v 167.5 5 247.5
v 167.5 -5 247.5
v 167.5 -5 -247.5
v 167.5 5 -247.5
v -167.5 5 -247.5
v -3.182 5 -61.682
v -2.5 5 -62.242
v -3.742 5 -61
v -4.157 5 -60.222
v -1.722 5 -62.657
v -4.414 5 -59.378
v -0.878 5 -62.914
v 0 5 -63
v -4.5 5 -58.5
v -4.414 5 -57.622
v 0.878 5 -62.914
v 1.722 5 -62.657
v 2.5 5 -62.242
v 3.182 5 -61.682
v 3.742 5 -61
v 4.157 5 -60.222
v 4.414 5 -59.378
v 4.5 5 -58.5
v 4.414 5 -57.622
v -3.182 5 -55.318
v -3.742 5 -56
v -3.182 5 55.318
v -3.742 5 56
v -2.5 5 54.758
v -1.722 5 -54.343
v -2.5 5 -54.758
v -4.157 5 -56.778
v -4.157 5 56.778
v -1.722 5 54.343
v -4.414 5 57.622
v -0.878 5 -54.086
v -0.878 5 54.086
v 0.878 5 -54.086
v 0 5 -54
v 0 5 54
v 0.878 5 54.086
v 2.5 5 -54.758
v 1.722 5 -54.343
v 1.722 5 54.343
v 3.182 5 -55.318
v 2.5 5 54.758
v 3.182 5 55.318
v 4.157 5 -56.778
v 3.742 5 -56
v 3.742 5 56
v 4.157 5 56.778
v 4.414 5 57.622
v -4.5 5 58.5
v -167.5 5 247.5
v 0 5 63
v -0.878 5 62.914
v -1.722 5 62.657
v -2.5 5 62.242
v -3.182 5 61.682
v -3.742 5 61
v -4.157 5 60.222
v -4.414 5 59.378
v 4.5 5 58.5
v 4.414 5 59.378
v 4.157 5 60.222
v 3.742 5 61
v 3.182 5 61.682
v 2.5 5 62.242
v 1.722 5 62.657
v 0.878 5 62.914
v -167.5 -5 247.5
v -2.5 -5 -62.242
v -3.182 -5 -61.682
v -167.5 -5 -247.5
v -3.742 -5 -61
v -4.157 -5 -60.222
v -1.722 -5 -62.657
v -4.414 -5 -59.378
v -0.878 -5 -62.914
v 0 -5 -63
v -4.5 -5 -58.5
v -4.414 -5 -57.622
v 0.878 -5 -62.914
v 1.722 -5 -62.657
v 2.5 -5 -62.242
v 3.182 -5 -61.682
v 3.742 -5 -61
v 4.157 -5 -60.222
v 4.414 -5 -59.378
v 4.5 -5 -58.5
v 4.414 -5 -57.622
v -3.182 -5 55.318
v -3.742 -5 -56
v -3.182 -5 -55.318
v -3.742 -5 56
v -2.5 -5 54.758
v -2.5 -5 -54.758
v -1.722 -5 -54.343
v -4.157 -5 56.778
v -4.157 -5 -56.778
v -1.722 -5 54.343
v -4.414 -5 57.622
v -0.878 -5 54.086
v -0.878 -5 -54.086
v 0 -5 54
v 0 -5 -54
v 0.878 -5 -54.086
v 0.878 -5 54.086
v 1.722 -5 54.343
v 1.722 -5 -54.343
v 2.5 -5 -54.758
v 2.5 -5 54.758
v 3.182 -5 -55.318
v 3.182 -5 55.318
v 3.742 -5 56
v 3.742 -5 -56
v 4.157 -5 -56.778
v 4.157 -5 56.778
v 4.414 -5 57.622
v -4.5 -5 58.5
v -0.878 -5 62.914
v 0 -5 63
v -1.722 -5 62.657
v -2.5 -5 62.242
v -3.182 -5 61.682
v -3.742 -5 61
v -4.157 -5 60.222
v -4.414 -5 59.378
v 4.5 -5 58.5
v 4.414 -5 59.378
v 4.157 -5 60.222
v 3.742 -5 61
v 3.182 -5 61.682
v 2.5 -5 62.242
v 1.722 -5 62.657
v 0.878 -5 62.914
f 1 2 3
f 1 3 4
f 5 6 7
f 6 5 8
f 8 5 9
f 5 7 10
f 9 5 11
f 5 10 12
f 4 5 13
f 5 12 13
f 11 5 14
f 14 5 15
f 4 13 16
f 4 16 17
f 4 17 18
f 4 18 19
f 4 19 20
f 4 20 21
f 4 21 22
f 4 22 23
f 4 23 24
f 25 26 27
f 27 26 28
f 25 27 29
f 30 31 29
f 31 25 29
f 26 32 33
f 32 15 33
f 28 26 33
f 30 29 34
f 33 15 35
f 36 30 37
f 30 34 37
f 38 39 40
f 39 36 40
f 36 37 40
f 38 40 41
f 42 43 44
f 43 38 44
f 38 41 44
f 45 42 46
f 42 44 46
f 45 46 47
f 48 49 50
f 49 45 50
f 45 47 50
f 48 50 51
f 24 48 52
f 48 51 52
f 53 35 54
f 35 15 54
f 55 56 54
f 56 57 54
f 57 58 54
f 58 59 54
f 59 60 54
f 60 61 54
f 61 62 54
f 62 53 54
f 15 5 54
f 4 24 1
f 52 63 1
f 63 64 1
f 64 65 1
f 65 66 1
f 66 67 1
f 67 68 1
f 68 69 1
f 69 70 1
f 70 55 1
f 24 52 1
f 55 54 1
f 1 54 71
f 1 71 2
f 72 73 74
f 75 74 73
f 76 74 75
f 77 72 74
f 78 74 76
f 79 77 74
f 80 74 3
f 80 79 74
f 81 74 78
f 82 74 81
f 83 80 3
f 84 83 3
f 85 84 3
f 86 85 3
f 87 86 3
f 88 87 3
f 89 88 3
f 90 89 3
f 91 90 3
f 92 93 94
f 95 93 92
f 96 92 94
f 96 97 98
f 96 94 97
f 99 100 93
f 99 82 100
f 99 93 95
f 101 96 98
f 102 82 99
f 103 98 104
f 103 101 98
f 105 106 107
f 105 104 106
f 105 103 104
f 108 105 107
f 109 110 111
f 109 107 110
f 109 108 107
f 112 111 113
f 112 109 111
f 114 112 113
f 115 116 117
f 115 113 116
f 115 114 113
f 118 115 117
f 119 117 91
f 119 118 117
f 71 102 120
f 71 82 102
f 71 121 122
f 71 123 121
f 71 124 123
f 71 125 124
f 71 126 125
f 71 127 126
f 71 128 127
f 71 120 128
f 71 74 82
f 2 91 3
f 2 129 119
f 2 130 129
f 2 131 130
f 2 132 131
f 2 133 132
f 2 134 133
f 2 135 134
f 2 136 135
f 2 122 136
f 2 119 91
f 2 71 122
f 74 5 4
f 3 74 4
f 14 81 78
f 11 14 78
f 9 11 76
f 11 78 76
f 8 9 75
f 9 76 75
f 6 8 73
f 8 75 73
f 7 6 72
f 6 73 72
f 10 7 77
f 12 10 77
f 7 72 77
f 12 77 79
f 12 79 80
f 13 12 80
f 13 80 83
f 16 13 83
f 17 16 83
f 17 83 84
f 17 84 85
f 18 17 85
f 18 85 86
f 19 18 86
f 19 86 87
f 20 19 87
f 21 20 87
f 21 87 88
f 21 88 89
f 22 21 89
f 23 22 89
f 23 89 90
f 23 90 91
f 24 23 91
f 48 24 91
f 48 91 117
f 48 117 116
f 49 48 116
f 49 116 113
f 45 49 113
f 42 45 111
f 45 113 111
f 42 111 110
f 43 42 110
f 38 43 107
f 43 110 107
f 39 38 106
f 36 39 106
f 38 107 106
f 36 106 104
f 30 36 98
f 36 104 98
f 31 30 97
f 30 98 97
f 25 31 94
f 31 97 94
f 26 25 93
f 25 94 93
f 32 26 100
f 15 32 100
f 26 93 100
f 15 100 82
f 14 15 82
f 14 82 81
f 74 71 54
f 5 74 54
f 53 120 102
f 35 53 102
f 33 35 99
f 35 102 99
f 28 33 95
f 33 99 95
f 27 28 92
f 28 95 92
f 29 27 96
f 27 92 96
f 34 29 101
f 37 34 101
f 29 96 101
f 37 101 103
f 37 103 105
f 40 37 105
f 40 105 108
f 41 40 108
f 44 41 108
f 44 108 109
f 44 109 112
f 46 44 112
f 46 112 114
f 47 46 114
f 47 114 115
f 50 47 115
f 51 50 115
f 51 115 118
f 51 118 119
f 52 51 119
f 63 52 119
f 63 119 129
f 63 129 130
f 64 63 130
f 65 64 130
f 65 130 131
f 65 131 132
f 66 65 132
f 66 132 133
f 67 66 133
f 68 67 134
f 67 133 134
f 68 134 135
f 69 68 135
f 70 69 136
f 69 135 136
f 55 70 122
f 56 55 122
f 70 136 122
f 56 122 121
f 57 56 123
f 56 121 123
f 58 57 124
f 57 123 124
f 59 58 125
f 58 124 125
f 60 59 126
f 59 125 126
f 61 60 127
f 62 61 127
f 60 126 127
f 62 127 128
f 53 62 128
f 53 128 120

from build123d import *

# Parameters (mm, degrees)
SKIZZE1_W                       = 335
SKIZZE1_H                       = 10
AUFSATZ_LINEAR_AUSTRAGEN1_DEPTH = 247.5
DURCHGANGSLOCH_F_R_M81_D        = 9


with BuildPart() as part:
    # Skizze1 → Aufsatz-Linear austragen1 (new, symmetric)
    with BuildSketch(Plane.XY):
        Rectangle(SKIZZE1_W, SKIZZE1_H)
    extrude(amount=AUFSATZ_LINEAR_AUSTRAGEN1_DEPTH, both=True)

    # Durchgangsloch für M81 (through all)
    with Locations(Plane(origin=(0, 5, 0), x_dir=(1, 0, 0), z_dir=(0, 1, 0))):
        with Locations((0, 58.5), (0, -58.5)):
            Hole(DURCHGANGSLOCH_F_R_M81_D / 2)


solid = part.part
